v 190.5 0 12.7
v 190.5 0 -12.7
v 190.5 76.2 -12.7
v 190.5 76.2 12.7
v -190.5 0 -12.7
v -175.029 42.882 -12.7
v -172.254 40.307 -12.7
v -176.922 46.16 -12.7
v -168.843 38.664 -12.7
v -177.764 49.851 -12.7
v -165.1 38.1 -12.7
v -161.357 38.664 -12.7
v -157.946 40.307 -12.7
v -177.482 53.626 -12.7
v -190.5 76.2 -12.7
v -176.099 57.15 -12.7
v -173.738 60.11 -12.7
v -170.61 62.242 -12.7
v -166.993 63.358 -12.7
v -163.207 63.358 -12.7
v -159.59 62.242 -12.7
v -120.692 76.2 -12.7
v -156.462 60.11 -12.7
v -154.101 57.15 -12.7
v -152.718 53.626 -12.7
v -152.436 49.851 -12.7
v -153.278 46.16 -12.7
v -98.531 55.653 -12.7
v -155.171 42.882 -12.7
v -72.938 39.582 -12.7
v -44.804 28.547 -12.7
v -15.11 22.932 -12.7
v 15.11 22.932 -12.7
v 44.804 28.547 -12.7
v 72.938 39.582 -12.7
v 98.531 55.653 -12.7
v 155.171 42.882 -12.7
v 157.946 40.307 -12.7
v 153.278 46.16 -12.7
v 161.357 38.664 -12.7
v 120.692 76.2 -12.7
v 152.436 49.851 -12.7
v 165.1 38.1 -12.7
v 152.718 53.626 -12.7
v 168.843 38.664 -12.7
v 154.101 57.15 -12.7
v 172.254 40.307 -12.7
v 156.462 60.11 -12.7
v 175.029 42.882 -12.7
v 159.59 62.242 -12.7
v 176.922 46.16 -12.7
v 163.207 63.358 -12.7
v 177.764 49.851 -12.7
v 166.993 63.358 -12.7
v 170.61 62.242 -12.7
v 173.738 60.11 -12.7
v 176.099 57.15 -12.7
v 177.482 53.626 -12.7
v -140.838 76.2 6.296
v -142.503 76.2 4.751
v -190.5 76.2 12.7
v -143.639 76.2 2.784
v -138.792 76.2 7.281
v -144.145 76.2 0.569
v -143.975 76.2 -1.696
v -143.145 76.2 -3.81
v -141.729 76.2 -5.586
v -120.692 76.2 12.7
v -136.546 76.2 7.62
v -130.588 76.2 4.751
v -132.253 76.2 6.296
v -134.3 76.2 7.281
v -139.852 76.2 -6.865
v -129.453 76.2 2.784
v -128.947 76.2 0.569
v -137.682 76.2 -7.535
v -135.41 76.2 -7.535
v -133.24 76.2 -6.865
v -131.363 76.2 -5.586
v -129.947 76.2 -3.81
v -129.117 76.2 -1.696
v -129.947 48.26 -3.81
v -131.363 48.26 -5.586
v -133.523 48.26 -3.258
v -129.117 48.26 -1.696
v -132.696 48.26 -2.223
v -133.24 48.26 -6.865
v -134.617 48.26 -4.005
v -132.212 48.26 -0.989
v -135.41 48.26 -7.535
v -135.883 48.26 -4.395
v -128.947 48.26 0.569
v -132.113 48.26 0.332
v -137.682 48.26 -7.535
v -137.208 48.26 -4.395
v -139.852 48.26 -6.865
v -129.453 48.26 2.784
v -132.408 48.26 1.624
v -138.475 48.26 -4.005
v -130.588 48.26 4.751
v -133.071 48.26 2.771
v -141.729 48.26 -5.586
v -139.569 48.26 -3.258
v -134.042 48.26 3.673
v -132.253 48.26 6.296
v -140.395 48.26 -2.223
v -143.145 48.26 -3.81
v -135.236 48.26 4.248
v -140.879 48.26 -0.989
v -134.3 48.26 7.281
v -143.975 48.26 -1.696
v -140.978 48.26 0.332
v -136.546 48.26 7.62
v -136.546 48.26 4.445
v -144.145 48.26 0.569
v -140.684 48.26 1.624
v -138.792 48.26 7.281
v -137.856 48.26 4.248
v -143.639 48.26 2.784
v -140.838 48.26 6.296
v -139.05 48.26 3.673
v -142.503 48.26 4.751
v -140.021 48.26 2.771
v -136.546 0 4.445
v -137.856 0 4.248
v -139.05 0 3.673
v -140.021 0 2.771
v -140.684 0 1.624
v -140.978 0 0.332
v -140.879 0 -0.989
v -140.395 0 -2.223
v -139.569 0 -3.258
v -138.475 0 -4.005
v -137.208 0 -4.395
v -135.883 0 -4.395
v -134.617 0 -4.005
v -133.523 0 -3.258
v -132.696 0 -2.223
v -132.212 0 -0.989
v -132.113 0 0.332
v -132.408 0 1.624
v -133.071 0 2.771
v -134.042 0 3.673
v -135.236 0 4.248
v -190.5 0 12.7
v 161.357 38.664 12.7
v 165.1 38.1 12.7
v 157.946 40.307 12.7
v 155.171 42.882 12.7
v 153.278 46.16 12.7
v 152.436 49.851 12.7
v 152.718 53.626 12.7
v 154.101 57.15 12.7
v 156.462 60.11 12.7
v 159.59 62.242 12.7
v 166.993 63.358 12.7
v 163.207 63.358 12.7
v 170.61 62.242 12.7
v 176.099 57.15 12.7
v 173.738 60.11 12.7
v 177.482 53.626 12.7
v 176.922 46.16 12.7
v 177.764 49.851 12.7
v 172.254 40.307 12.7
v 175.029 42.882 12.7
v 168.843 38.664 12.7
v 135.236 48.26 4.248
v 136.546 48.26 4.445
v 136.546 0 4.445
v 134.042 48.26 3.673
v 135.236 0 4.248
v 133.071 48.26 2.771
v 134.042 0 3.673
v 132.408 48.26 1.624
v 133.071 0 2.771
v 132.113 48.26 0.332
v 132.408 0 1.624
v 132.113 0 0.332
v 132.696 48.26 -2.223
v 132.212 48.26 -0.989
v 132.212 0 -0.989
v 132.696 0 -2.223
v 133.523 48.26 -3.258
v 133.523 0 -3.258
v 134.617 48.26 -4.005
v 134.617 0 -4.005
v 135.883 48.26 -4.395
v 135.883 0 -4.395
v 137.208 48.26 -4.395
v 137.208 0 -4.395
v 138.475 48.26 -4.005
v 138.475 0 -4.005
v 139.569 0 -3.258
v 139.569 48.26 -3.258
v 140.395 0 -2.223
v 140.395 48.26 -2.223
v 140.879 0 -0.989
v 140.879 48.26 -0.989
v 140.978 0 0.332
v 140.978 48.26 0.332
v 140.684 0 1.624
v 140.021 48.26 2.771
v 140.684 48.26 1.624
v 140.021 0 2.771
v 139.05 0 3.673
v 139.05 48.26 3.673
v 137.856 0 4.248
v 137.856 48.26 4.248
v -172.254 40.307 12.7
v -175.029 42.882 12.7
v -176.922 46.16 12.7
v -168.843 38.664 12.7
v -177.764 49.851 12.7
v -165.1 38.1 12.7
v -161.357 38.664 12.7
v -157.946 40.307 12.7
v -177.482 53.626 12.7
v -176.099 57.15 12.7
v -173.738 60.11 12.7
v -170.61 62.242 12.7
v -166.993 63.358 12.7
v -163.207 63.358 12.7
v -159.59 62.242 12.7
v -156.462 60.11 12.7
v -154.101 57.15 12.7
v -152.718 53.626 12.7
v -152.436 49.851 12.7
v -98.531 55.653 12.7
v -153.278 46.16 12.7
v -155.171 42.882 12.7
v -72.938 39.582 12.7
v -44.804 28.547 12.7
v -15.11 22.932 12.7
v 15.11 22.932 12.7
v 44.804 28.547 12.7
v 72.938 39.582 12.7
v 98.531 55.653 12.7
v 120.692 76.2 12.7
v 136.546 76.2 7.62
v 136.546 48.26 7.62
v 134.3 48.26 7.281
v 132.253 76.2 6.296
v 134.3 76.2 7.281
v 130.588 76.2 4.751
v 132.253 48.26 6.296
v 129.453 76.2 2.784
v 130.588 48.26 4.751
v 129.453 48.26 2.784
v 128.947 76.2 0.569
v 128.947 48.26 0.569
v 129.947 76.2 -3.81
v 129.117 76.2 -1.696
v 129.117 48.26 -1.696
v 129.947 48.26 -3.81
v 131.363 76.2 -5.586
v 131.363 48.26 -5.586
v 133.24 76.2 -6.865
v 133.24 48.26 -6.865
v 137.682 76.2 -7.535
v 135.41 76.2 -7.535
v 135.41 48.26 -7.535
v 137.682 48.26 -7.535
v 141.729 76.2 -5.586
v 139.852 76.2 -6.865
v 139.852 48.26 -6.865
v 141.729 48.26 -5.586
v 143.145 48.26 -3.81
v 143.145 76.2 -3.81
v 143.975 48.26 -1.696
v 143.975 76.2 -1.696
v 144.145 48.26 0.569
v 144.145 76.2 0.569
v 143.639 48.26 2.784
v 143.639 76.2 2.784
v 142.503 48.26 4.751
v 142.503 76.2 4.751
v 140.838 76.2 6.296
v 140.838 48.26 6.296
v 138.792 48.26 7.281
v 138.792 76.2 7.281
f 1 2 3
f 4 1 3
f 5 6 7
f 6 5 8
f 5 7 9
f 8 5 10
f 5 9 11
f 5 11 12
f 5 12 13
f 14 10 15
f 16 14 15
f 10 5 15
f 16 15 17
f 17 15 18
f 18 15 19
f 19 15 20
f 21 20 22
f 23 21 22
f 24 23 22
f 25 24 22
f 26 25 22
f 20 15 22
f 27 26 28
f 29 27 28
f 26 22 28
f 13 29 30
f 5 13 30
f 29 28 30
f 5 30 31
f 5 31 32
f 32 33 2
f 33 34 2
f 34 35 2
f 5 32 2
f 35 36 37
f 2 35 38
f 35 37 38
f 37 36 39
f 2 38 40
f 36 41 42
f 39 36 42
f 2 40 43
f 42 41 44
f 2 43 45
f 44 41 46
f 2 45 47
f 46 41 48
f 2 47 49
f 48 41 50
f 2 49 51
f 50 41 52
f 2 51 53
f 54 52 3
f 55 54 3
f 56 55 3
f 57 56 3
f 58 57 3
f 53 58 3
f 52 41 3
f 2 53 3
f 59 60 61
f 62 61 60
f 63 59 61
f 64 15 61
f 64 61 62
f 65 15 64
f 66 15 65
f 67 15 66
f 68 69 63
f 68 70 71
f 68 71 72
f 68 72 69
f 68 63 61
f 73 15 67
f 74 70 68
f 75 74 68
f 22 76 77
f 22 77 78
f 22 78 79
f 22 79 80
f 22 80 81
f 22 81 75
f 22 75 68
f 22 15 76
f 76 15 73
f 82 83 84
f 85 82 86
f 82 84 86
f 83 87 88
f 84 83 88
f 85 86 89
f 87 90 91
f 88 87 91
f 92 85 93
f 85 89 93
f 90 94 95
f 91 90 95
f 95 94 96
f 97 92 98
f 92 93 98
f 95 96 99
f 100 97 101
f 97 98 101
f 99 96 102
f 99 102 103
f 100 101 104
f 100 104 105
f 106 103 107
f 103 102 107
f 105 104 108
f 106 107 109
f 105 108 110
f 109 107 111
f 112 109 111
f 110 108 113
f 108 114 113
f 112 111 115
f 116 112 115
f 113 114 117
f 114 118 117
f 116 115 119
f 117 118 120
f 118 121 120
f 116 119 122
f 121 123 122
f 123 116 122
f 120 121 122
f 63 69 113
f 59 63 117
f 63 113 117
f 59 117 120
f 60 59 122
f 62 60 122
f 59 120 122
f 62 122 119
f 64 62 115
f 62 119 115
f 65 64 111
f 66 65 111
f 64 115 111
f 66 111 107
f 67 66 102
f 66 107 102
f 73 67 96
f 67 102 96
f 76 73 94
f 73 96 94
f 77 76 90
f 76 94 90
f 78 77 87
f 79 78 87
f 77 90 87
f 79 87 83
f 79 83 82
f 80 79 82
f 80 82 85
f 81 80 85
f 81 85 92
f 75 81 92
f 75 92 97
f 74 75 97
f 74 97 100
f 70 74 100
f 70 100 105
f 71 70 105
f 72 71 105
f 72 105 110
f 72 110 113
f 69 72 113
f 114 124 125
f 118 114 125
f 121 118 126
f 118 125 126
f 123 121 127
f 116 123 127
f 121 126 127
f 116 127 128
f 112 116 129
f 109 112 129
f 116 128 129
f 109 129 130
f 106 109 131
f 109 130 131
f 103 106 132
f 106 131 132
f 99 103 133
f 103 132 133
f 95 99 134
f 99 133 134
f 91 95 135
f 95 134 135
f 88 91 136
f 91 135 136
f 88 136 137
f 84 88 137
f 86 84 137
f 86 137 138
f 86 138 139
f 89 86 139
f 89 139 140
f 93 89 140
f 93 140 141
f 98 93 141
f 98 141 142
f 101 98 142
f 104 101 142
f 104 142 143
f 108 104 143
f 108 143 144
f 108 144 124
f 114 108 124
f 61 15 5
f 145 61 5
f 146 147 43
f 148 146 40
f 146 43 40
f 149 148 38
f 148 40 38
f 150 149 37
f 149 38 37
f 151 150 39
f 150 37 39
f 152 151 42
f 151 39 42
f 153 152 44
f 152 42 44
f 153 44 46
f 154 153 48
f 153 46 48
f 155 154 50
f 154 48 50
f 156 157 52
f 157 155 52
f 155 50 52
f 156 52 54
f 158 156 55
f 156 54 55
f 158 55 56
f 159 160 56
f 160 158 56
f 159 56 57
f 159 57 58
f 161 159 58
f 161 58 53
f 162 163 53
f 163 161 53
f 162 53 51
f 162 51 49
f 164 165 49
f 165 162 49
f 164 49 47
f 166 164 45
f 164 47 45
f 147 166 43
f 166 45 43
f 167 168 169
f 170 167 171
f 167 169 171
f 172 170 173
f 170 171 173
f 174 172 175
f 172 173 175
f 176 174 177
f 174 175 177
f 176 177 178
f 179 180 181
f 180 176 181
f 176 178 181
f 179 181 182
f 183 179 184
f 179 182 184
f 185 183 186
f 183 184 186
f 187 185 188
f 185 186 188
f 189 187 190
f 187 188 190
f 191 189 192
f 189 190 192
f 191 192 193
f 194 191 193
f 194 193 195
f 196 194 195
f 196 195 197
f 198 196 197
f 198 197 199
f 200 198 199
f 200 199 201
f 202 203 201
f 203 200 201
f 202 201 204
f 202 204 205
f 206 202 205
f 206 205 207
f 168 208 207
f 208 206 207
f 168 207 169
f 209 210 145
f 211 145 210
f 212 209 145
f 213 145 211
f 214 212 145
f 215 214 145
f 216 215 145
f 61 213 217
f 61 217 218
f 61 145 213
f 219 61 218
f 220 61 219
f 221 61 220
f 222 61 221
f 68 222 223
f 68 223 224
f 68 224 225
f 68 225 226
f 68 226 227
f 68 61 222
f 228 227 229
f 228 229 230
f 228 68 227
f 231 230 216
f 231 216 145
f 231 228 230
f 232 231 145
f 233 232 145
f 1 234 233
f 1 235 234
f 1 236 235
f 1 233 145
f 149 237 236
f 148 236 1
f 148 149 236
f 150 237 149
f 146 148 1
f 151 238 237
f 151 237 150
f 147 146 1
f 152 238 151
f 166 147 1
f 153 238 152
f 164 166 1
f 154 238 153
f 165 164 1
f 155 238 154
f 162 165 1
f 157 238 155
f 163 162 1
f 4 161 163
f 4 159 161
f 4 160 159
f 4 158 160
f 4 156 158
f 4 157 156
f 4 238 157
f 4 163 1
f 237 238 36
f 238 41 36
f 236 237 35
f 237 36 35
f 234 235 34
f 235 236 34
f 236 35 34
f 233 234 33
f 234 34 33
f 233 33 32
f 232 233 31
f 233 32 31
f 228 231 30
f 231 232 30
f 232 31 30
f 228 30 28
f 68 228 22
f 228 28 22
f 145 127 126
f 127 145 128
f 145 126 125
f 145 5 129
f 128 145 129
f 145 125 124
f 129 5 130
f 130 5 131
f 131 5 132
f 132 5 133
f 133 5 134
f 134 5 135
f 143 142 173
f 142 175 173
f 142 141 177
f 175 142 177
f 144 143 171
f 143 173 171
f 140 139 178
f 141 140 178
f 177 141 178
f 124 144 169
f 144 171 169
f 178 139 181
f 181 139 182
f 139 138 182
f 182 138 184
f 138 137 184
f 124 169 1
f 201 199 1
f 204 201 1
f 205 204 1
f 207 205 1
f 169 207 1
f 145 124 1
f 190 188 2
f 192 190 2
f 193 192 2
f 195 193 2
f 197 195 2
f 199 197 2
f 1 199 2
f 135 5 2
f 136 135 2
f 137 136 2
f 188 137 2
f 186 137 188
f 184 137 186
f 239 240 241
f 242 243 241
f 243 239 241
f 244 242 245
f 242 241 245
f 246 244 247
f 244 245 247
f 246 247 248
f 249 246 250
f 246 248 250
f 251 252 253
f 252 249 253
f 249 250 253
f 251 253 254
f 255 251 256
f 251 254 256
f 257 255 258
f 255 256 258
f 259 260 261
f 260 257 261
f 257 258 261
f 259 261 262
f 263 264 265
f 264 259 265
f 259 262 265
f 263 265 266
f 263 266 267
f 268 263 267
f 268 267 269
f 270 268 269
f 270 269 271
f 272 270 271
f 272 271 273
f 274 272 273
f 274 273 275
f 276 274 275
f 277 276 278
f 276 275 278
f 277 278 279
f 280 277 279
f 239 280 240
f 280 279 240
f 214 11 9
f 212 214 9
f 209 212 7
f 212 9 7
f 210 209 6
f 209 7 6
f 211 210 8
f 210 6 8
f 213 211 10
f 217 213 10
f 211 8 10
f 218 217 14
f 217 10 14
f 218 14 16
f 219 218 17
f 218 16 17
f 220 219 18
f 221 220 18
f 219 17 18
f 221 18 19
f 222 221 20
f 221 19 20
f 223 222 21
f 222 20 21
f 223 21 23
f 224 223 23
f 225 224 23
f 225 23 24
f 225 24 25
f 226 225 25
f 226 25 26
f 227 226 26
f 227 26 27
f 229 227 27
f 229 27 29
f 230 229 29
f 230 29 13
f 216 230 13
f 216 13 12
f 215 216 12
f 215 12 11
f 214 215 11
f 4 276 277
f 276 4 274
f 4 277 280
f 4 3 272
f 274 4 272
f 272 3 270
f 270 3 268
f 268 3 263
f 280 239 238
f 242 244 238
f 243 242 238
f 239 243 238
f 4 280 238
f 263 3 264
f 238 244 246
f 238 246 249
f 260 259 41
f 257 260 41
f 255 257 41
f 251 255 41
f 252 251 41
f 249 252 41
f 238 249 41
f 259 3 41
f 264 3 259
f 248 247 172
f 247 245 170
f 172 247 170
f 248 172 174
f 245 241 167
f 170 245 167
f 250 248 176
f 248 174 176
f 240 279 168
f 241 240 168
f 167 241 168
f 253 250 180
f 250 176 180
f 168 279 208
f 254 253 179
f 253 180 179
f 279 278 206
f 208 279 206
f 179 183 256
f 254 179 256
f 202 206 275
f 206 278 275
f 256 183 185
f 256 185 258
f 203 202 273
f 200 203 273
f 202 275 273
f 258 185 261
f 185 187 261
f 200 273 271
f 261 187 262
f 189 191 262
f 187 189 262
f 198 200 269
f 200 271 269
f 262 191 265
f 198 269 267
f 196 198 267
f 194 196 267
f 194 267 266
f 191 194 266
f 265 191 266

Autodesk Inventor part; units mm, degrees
ref_plane "YZ Plane" through (0, 0, 0) normal (1, 0, 0) x (0, 1, 0)
ref_plane "XZ Plane" through (0, 0, 0) normal (0, 1, 0) x (-1, 0, 0)
ref_plane "XY Plane" through (0, 0, 0) normal (0, 0, 1) x (1, 0, 0)
sketch "Sketch1" plane through (0, 0, 0) normal (0, 0, 1) x (1, 0, 0)
  line L0 (-190.5, 76.2) -> (-190.5, 0)
  line L1 (-190.5, 0) -> (190.5, 0)
  line L2 (190.5, 0) -> (190.5, 76.2)
  line L3 (190.5, 76.2) -> (120.6918, 76.2)
  line L4 (-190.5, 76.2) -> (-120.6918, 76.2)
  arc A0 (-120.6918, 76.2) -> (120.6918, 76.2) centre (0, 184.15) ccw
  point P0 (0, 0)
  point P1 (0, 0)
  dimension "d0" = 161.925
  dimension "d1" = 381
  dimension "d2" = 190.5
  dimension "d3" = 76.2
  dimension "d4" = 184.15
extrude "Extrusion1" add sketch "Sketch1" along normal mid plane 25.4
sketch "Sketch2" plane through (-190.5, 76.2, 12.7) normal (0, 1, 0) x (1, 0, 0)
  line L0 (0, 25.4) -> (69.8082, 0) construction
  line L1 (69.8082, 0) -> (0, 0) projected
  line L2 (69.8082, 25.4) -> (69.8082, 0) projected
  line L3 (0, 0) -> (0, 25.4) projected
  line L4 (0, 25.4) -> (69.8082, 25.4) projected
  line L5 (0, 0) -> (69.8082, 25.4) construction
  point P0 (53.9541, 12.7)
  point P1 (34.9041, 12.7)
  dimension "d14" = 19.05
hole "Hole1" at (-136.5459, 76.2, 0) direction (0, -1, 0) diameter 8.89 end through all counterbore diameter 15.24 counterbore depth 27.94 clearance for "Socket Head Cap Screw" size "M8" standard "Ansi Metric M Profile"
sketch "Sketch3" plane through (0, 0, 12.7) normal (0, 0, 1) x (1, 0, 0)
  line L0 (-120.6918, 76.2) -> (-190.5, 76.2) projected
  line L1 (-190.5, 76.2) -> (-190.5, 0) projected
  point P0 (0, 0)
  point P1 (-165.1, 50.8)
  dimension "d23" = 25.4
  dimension "d24" = 25.4
hole "Hole2" at (-165.1, 50.8, 12.7) direction (0, 0, -1) diameter 25.4 end through all
mirror "Mirror1" about plane through (0, 0, 0) normal (1, 0, 0) of "Hole1", "Hole2"
equation "\"d2\" = 0.5 * d1"
properties part number "Tank Holder"
